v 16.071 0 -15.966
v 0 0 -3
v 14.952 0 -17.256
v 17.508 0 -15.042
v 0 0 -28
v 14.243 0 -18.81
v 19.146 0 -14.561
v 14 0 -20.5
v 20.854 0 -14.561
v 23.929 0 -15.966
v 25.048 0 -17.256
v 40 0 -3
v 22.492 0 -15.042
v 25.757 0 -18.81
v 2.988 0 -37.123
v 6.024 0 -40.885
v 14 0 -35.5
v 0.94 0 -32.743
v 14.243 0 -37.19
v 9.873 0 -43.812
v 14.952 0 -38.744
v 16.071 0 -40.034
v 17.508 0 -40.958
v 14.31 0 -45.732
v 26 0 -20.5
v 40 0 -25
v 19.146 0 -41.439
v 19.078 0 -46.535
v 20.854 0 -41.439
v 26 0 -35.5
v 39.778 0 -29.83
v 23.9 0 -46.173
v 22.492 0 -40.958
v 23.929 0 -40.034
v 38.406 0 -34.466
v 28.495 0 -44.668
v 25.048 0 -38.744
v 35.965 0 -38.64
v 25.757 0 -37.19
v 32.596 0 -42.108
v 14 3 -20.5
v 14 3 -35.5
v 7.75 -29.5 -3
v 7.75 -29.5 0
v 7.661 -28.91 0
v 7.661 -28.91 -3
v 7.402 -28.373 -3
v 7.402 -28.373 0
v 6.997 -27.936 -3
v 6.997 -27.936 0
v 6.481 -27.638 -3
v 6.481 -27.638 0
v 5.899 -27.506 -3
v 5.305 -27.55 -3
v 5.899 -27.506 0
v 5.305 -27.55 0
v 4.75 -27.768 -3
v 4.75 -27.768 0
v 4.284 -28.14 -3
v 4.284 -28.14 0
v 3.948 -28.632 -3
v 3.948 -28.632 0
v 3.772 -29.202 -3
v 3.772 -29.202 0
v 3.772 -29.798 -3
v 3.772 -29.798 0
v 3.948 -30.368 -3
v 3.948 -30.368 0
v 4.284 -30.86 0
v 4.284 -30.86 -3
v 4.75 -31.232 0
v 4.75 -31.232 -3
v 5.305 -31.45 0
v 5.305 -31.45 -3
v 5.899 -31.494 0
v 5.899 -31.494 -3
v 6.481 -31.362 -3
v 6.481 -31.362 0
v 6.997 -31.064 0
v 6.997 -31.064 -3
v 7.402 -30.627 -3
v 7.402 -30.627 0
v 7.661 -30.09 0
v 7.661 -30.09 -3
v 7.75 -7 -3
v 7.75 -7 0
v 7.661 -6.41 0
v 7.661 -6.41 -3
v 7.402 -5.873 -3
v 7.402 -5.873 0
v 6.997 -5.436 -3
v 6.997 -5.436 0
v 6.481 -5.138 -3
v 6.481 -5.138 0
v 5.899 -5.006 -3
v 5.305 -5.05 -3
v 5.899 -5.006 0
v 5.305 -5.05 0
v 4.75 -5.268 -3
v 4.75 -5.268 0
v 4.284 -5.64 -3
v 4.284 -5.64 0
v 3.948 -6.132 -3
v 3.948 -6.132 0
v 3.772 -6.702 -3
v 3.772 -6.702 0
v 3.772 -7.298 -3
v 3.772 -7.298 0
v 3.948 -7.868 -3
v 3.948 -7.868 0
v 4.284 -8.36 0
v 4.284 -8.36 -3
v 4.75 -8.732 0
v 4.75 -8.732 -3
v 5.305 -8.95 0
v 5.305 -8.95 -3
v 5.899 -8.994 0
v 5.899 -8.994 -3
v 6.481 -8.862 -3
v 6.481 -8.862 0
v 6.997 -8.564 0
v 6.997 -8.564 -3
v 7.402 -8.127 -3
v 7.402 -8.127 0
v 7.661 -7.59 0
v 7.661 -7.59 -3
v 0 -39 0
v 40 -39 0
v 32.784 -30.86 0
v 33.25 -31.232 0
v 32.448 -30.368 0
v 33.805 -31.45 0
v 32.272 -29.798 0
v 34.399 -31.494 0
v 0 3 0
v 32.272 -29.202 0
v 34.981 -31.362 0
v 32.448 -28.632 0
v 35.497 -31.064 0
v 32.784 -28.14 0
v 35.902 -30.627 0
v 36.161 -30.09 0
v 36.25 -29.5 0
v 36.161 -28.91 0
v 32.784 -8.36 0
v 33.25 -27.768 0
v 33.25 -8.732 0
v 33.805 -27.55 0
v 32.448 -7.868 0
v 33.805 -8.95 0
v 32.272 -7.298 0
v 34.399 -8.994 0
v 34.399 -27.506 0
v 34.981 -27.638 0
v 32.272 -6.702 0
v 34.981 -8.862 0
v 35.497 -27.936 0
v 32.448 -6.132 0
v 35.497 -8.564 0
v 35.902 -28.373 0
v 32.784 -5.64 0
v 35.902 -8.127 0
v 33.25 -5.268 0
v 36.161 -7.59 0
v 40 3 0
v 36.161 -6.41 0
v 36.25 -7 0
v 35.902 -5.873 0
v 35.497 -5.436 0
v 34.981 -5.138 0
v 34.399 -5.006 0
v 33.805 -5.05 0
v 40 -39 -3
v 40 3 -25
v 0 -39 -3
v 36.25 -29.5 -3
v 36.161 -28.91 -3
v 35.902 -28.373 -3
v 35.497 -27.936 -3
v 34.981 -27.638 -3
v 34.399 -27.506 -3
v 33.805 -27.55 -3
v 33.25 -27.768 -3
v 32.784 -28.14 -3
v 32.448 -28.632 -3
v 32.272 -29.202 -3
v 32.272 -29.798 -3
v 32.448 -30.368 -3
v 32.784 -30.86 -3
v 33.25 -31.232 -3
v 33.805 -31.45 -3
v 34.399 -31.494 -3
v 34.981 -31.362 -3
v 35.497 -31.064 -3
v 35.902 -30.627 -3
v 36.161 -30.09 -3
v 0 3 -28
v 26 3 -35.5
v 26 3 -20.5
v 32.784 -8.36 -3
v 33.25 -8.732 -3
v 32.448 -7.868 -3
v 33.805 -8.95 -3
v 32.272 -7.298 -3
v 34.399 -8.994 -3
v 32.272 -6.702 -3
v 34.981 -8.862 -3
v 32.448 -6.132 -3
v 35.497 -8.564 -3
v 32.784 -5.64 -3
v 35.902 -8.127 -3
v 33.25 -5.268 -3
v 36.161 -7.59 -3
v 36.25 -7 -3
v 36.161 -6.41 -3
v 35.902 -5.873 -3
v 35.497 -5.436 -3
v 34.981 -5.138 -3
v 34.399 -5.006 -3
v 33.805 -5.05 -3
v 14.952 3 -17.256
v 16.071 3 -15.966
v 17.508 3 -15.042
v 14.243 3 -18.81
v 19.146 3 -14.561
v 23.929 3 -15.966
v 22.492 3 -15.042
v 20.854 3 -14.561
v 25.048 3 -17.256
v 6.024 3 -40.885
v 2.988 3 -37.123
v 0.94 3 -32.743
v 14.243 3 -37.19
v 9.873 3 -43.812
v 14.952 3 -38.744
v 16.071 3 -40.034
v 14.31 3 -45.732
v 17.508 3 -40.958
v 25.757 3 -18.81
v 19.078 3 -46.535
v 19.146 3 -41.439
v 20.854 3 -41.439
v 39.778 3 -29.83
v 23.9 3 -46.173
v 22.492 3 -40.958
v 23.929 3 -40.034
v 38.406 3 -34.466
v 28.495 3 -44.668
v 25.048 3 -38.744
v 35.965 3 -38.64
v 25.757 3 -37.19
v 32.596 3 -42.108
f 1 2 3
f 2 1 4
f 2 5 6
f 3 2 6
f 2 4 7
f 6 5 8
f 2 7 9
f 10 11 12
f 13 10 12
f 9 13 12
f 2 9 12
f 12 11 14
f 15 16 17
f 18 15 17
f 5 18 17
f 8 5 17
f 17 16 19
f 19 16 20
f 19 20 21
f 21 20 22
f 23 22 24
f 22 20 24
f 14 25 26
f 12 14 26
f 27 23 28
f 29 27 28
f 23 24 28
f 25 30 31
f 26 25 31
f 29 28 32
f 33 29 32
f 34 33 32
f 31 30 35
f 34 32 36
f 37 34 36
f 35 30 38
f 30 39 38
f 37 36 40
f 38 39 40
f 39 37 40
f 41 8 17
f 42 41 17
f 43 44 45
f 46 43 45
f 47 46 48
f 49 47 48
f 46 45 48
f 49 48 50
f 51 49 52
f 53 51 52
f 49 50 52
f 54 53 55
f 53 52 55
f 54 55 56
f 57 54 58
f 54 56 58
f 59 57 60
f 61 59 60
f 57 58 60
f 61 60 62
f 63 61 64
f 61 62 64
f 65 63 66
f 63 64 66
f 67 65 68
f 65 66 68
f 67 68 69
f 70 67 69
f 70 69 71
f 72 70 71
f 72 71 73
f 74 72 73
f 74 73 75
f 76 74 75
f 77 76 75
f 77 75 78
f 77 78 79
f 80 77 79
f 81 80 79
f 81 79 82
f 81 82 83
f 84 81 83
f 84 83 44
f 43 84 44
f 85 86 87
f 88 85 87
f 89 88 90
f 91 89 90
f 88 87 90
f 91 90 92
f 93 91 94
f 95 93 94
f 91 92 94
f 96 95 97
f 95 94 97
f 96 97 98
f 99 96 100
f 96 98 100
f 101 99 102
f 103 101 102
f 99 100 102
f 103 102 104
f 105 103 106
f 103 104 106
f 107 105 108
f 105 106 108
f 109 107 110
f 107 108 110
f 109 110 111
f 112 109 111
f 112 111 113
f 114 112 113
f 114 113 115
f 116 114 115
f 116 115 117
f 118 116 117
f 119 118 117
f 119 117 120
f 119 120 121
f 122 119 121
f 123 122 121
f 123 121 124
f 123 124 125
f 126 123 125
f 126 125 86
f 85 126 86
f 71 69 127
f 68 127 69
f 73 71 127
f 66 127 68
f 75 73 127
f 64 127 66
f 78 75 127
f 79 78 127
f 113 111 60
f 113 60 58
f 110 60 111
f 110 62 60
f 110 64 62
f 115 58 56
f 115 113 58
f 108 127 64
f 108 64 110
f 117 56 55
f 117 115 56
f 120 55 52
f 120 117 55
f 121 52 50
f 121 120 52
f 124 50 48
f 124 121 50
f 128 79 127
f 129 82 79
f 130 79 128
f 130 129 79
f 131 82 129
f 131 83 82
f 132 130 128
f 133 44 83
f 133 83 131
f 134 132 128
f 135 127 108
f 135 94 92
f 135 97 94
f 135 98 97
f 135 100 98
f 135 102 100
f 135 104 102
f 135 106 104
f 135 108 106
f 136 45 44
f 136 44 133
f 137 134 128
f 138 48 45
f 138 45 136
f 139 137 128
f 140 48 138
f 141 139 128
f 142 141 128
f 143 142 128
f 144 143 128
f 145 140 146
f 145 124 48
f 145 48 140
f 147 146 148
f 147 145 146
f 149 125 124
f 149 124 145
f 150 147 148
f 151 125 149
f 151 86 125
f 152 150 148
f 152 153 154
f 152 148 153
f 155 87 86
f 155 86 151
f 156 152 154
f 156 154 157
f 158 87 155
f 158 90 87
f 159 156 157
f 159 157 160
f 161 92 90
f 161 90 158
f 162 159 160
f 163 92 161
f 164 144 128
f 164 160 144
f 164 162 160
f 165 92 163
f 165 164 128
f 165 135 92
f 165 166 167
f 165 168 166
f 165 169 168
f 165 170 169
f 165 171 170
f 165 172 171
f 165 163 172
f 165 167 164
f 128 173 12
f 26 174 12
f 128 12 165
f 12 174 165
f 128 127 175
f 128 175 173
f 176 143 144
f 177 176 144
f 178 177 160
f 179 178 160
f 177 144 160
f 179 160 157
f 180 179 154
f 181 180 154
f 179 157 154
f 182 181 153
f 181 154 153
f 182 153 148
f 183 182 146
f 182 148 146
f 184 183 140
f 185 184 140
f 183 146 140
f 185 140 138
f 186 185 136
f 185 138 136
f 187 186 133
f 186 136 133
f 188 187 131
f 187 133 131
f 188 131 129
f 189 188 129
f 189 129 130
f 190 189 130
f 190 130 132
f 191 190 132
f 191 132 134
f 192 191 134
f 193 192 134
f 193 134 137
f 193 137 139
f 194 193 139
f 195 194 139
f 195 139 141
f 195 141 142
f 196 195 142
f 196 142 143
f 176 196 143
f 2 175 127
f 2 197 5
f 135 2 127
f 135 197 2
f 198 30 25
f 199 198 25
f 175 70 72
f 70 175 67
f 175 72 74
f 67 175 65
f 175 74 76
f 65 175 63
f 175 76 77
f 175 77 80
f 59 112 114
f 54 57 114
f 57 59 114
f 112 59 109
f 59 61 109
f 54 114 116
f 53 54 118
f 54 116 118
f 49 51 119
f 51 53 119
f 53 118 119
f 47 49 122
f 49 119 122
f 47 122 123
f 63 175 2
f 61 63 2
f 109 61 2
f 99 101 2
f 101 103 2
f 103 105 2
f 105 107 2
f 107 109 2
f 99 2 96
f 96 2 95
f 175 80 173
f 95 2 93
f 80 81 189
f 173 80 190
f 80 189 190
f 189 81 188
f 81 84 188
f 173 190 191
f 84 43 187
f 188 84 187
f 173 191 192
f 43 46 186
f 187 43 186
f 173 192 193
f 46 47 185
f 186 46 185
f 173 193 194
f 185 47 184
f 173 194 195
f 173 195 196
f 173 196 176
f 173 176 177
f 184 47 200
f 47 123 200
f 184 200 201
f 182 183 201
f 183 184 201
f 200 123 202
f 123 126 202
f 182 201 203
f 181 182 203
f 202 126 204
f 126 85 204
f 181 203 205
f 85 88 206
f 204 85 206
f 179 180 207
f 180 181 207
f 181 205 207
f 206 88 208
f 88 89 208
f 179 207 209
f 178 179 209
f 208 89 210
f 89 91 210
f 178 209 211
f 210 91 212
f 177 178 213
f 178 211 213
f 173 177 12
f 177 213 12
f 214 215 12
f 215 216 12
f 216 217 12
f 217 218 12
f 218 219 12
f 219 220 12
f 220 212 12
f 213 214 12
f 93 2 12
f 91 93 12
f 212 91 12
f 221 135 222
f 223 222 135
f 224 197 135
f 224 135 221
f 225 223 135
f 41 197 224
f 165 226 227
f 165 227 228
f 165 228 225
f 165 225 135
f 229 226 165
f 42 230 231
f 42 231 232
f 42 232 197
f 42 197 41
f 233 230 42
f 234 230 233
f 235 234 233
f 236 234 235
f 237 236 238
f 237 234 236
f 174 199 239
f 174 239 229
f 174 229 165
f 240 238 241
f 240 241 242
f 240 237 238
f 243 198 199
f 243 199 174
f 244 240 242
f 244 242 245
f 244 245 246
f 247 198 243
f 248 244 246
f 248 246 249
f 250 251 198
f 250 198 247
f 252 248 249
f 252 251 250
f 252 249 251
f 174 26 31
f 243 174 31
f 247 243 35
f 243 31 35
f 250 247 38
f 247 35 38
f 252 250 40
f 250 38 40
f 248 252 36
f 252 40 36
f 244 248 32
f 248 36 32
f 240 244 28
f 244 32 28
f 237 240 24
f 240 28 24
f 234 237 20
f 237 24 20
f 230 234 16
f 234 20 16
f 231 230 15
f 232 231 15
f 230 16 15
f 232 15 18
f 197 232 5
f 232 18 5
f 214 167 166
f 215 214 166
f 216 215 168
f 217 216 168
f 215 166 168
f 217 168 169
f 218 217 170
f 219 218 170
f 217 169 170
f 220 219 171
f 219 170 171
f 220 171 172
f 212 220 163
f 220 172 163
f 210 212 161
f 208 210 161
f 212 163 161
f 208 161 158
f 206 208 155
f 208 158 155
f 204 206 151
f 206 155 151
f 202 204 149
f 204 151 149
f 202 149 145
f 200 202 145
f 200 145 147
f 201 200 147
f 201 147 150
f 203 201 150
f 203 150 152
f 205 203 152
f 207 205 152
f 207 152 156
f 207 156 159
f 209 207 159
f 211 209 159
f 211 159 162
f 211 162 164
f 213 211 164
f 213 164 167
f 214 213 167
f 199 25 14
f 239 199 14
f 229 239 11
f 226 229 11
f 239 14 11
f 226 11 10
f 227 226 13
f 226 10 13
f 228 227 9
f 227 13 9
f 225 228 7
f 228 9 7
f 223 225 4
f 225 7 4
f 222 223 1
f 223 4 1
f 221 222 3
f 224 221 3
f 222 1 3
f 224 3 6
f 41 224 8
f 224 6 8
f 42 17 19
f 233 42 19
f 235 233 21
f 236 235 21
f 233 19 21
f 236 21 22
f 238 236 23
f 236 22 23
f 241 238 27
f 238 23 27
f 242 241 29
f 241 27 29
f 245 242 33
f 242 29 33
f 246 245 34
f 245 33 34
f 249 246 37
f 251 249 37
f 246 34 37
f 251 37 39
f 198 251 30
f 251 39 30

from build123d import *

# Parameters (mm, degrees)
EXTRUDE2_DEPTH = 3
SKETCH3_W      = 40
SKETCH3_H      = 3
EXTRUDE3_DEPTH = 39
SKETCH4_R      = 2
EXTRUDE4_DEPTH = 73.752827534


with BuildPart() as part:
    # Sketch1 → Extrude2 (new body)
    with BuildSketch(Plane(origin=(0, 0, 0), x_dir=(1, 0, 0), z_dir=(0, 1, 0))):
        with BuildLine():
            Line((0, 0), (40, 0))
            Line((40, 0), (40, 25))
            ThreePointArc((40, 25), (21.5, 46.5), (0, 28))
            Line((0, 28), (0, 0))
        make_face()
        with BuildLine():
            Line((26, 35.5), (26, 20.5))
            ThreePointArc((26, 20.5), (20, 14.5), (14, 20.5))
            Line((14, 20.5), (14, 35.5))
            ThreePointArc((14, 35.5), (20, 41.5), (26, 35.5))
        make_face(mode=Mode.SUBTRACT)
    extrude(amount=EXTRUDE2_DEPTH)

    # Sketch3 → Extrude3 (add)
    with BuildSketch(Plane.XZ):
        with Locations((20, -1.5)):
            Rectangle(SKETCH3_W, SKETCH3_H)
    extrude(amount=EXTRUDE3_DEPTH)

    # Sketch4 → Extrude4 (cut, through all)
    with BuildSketch(Plane.XY):
        with Locations((34.25, -7)):
            Circle(SKETCH4_R)
        with Locations((5.75, -7)):
            Circle(SKETCH4_R)
        with Locations((5.75, -29.5)):
            Circle(SKETCH4_R)
        with Locations((34.25, -29.5)):
            Circle(SKETCH4_R)
    extrude(amount=-EXTRUDE4_DEPTH, mode=Mode.SUBTRACT)


solid = part.part
